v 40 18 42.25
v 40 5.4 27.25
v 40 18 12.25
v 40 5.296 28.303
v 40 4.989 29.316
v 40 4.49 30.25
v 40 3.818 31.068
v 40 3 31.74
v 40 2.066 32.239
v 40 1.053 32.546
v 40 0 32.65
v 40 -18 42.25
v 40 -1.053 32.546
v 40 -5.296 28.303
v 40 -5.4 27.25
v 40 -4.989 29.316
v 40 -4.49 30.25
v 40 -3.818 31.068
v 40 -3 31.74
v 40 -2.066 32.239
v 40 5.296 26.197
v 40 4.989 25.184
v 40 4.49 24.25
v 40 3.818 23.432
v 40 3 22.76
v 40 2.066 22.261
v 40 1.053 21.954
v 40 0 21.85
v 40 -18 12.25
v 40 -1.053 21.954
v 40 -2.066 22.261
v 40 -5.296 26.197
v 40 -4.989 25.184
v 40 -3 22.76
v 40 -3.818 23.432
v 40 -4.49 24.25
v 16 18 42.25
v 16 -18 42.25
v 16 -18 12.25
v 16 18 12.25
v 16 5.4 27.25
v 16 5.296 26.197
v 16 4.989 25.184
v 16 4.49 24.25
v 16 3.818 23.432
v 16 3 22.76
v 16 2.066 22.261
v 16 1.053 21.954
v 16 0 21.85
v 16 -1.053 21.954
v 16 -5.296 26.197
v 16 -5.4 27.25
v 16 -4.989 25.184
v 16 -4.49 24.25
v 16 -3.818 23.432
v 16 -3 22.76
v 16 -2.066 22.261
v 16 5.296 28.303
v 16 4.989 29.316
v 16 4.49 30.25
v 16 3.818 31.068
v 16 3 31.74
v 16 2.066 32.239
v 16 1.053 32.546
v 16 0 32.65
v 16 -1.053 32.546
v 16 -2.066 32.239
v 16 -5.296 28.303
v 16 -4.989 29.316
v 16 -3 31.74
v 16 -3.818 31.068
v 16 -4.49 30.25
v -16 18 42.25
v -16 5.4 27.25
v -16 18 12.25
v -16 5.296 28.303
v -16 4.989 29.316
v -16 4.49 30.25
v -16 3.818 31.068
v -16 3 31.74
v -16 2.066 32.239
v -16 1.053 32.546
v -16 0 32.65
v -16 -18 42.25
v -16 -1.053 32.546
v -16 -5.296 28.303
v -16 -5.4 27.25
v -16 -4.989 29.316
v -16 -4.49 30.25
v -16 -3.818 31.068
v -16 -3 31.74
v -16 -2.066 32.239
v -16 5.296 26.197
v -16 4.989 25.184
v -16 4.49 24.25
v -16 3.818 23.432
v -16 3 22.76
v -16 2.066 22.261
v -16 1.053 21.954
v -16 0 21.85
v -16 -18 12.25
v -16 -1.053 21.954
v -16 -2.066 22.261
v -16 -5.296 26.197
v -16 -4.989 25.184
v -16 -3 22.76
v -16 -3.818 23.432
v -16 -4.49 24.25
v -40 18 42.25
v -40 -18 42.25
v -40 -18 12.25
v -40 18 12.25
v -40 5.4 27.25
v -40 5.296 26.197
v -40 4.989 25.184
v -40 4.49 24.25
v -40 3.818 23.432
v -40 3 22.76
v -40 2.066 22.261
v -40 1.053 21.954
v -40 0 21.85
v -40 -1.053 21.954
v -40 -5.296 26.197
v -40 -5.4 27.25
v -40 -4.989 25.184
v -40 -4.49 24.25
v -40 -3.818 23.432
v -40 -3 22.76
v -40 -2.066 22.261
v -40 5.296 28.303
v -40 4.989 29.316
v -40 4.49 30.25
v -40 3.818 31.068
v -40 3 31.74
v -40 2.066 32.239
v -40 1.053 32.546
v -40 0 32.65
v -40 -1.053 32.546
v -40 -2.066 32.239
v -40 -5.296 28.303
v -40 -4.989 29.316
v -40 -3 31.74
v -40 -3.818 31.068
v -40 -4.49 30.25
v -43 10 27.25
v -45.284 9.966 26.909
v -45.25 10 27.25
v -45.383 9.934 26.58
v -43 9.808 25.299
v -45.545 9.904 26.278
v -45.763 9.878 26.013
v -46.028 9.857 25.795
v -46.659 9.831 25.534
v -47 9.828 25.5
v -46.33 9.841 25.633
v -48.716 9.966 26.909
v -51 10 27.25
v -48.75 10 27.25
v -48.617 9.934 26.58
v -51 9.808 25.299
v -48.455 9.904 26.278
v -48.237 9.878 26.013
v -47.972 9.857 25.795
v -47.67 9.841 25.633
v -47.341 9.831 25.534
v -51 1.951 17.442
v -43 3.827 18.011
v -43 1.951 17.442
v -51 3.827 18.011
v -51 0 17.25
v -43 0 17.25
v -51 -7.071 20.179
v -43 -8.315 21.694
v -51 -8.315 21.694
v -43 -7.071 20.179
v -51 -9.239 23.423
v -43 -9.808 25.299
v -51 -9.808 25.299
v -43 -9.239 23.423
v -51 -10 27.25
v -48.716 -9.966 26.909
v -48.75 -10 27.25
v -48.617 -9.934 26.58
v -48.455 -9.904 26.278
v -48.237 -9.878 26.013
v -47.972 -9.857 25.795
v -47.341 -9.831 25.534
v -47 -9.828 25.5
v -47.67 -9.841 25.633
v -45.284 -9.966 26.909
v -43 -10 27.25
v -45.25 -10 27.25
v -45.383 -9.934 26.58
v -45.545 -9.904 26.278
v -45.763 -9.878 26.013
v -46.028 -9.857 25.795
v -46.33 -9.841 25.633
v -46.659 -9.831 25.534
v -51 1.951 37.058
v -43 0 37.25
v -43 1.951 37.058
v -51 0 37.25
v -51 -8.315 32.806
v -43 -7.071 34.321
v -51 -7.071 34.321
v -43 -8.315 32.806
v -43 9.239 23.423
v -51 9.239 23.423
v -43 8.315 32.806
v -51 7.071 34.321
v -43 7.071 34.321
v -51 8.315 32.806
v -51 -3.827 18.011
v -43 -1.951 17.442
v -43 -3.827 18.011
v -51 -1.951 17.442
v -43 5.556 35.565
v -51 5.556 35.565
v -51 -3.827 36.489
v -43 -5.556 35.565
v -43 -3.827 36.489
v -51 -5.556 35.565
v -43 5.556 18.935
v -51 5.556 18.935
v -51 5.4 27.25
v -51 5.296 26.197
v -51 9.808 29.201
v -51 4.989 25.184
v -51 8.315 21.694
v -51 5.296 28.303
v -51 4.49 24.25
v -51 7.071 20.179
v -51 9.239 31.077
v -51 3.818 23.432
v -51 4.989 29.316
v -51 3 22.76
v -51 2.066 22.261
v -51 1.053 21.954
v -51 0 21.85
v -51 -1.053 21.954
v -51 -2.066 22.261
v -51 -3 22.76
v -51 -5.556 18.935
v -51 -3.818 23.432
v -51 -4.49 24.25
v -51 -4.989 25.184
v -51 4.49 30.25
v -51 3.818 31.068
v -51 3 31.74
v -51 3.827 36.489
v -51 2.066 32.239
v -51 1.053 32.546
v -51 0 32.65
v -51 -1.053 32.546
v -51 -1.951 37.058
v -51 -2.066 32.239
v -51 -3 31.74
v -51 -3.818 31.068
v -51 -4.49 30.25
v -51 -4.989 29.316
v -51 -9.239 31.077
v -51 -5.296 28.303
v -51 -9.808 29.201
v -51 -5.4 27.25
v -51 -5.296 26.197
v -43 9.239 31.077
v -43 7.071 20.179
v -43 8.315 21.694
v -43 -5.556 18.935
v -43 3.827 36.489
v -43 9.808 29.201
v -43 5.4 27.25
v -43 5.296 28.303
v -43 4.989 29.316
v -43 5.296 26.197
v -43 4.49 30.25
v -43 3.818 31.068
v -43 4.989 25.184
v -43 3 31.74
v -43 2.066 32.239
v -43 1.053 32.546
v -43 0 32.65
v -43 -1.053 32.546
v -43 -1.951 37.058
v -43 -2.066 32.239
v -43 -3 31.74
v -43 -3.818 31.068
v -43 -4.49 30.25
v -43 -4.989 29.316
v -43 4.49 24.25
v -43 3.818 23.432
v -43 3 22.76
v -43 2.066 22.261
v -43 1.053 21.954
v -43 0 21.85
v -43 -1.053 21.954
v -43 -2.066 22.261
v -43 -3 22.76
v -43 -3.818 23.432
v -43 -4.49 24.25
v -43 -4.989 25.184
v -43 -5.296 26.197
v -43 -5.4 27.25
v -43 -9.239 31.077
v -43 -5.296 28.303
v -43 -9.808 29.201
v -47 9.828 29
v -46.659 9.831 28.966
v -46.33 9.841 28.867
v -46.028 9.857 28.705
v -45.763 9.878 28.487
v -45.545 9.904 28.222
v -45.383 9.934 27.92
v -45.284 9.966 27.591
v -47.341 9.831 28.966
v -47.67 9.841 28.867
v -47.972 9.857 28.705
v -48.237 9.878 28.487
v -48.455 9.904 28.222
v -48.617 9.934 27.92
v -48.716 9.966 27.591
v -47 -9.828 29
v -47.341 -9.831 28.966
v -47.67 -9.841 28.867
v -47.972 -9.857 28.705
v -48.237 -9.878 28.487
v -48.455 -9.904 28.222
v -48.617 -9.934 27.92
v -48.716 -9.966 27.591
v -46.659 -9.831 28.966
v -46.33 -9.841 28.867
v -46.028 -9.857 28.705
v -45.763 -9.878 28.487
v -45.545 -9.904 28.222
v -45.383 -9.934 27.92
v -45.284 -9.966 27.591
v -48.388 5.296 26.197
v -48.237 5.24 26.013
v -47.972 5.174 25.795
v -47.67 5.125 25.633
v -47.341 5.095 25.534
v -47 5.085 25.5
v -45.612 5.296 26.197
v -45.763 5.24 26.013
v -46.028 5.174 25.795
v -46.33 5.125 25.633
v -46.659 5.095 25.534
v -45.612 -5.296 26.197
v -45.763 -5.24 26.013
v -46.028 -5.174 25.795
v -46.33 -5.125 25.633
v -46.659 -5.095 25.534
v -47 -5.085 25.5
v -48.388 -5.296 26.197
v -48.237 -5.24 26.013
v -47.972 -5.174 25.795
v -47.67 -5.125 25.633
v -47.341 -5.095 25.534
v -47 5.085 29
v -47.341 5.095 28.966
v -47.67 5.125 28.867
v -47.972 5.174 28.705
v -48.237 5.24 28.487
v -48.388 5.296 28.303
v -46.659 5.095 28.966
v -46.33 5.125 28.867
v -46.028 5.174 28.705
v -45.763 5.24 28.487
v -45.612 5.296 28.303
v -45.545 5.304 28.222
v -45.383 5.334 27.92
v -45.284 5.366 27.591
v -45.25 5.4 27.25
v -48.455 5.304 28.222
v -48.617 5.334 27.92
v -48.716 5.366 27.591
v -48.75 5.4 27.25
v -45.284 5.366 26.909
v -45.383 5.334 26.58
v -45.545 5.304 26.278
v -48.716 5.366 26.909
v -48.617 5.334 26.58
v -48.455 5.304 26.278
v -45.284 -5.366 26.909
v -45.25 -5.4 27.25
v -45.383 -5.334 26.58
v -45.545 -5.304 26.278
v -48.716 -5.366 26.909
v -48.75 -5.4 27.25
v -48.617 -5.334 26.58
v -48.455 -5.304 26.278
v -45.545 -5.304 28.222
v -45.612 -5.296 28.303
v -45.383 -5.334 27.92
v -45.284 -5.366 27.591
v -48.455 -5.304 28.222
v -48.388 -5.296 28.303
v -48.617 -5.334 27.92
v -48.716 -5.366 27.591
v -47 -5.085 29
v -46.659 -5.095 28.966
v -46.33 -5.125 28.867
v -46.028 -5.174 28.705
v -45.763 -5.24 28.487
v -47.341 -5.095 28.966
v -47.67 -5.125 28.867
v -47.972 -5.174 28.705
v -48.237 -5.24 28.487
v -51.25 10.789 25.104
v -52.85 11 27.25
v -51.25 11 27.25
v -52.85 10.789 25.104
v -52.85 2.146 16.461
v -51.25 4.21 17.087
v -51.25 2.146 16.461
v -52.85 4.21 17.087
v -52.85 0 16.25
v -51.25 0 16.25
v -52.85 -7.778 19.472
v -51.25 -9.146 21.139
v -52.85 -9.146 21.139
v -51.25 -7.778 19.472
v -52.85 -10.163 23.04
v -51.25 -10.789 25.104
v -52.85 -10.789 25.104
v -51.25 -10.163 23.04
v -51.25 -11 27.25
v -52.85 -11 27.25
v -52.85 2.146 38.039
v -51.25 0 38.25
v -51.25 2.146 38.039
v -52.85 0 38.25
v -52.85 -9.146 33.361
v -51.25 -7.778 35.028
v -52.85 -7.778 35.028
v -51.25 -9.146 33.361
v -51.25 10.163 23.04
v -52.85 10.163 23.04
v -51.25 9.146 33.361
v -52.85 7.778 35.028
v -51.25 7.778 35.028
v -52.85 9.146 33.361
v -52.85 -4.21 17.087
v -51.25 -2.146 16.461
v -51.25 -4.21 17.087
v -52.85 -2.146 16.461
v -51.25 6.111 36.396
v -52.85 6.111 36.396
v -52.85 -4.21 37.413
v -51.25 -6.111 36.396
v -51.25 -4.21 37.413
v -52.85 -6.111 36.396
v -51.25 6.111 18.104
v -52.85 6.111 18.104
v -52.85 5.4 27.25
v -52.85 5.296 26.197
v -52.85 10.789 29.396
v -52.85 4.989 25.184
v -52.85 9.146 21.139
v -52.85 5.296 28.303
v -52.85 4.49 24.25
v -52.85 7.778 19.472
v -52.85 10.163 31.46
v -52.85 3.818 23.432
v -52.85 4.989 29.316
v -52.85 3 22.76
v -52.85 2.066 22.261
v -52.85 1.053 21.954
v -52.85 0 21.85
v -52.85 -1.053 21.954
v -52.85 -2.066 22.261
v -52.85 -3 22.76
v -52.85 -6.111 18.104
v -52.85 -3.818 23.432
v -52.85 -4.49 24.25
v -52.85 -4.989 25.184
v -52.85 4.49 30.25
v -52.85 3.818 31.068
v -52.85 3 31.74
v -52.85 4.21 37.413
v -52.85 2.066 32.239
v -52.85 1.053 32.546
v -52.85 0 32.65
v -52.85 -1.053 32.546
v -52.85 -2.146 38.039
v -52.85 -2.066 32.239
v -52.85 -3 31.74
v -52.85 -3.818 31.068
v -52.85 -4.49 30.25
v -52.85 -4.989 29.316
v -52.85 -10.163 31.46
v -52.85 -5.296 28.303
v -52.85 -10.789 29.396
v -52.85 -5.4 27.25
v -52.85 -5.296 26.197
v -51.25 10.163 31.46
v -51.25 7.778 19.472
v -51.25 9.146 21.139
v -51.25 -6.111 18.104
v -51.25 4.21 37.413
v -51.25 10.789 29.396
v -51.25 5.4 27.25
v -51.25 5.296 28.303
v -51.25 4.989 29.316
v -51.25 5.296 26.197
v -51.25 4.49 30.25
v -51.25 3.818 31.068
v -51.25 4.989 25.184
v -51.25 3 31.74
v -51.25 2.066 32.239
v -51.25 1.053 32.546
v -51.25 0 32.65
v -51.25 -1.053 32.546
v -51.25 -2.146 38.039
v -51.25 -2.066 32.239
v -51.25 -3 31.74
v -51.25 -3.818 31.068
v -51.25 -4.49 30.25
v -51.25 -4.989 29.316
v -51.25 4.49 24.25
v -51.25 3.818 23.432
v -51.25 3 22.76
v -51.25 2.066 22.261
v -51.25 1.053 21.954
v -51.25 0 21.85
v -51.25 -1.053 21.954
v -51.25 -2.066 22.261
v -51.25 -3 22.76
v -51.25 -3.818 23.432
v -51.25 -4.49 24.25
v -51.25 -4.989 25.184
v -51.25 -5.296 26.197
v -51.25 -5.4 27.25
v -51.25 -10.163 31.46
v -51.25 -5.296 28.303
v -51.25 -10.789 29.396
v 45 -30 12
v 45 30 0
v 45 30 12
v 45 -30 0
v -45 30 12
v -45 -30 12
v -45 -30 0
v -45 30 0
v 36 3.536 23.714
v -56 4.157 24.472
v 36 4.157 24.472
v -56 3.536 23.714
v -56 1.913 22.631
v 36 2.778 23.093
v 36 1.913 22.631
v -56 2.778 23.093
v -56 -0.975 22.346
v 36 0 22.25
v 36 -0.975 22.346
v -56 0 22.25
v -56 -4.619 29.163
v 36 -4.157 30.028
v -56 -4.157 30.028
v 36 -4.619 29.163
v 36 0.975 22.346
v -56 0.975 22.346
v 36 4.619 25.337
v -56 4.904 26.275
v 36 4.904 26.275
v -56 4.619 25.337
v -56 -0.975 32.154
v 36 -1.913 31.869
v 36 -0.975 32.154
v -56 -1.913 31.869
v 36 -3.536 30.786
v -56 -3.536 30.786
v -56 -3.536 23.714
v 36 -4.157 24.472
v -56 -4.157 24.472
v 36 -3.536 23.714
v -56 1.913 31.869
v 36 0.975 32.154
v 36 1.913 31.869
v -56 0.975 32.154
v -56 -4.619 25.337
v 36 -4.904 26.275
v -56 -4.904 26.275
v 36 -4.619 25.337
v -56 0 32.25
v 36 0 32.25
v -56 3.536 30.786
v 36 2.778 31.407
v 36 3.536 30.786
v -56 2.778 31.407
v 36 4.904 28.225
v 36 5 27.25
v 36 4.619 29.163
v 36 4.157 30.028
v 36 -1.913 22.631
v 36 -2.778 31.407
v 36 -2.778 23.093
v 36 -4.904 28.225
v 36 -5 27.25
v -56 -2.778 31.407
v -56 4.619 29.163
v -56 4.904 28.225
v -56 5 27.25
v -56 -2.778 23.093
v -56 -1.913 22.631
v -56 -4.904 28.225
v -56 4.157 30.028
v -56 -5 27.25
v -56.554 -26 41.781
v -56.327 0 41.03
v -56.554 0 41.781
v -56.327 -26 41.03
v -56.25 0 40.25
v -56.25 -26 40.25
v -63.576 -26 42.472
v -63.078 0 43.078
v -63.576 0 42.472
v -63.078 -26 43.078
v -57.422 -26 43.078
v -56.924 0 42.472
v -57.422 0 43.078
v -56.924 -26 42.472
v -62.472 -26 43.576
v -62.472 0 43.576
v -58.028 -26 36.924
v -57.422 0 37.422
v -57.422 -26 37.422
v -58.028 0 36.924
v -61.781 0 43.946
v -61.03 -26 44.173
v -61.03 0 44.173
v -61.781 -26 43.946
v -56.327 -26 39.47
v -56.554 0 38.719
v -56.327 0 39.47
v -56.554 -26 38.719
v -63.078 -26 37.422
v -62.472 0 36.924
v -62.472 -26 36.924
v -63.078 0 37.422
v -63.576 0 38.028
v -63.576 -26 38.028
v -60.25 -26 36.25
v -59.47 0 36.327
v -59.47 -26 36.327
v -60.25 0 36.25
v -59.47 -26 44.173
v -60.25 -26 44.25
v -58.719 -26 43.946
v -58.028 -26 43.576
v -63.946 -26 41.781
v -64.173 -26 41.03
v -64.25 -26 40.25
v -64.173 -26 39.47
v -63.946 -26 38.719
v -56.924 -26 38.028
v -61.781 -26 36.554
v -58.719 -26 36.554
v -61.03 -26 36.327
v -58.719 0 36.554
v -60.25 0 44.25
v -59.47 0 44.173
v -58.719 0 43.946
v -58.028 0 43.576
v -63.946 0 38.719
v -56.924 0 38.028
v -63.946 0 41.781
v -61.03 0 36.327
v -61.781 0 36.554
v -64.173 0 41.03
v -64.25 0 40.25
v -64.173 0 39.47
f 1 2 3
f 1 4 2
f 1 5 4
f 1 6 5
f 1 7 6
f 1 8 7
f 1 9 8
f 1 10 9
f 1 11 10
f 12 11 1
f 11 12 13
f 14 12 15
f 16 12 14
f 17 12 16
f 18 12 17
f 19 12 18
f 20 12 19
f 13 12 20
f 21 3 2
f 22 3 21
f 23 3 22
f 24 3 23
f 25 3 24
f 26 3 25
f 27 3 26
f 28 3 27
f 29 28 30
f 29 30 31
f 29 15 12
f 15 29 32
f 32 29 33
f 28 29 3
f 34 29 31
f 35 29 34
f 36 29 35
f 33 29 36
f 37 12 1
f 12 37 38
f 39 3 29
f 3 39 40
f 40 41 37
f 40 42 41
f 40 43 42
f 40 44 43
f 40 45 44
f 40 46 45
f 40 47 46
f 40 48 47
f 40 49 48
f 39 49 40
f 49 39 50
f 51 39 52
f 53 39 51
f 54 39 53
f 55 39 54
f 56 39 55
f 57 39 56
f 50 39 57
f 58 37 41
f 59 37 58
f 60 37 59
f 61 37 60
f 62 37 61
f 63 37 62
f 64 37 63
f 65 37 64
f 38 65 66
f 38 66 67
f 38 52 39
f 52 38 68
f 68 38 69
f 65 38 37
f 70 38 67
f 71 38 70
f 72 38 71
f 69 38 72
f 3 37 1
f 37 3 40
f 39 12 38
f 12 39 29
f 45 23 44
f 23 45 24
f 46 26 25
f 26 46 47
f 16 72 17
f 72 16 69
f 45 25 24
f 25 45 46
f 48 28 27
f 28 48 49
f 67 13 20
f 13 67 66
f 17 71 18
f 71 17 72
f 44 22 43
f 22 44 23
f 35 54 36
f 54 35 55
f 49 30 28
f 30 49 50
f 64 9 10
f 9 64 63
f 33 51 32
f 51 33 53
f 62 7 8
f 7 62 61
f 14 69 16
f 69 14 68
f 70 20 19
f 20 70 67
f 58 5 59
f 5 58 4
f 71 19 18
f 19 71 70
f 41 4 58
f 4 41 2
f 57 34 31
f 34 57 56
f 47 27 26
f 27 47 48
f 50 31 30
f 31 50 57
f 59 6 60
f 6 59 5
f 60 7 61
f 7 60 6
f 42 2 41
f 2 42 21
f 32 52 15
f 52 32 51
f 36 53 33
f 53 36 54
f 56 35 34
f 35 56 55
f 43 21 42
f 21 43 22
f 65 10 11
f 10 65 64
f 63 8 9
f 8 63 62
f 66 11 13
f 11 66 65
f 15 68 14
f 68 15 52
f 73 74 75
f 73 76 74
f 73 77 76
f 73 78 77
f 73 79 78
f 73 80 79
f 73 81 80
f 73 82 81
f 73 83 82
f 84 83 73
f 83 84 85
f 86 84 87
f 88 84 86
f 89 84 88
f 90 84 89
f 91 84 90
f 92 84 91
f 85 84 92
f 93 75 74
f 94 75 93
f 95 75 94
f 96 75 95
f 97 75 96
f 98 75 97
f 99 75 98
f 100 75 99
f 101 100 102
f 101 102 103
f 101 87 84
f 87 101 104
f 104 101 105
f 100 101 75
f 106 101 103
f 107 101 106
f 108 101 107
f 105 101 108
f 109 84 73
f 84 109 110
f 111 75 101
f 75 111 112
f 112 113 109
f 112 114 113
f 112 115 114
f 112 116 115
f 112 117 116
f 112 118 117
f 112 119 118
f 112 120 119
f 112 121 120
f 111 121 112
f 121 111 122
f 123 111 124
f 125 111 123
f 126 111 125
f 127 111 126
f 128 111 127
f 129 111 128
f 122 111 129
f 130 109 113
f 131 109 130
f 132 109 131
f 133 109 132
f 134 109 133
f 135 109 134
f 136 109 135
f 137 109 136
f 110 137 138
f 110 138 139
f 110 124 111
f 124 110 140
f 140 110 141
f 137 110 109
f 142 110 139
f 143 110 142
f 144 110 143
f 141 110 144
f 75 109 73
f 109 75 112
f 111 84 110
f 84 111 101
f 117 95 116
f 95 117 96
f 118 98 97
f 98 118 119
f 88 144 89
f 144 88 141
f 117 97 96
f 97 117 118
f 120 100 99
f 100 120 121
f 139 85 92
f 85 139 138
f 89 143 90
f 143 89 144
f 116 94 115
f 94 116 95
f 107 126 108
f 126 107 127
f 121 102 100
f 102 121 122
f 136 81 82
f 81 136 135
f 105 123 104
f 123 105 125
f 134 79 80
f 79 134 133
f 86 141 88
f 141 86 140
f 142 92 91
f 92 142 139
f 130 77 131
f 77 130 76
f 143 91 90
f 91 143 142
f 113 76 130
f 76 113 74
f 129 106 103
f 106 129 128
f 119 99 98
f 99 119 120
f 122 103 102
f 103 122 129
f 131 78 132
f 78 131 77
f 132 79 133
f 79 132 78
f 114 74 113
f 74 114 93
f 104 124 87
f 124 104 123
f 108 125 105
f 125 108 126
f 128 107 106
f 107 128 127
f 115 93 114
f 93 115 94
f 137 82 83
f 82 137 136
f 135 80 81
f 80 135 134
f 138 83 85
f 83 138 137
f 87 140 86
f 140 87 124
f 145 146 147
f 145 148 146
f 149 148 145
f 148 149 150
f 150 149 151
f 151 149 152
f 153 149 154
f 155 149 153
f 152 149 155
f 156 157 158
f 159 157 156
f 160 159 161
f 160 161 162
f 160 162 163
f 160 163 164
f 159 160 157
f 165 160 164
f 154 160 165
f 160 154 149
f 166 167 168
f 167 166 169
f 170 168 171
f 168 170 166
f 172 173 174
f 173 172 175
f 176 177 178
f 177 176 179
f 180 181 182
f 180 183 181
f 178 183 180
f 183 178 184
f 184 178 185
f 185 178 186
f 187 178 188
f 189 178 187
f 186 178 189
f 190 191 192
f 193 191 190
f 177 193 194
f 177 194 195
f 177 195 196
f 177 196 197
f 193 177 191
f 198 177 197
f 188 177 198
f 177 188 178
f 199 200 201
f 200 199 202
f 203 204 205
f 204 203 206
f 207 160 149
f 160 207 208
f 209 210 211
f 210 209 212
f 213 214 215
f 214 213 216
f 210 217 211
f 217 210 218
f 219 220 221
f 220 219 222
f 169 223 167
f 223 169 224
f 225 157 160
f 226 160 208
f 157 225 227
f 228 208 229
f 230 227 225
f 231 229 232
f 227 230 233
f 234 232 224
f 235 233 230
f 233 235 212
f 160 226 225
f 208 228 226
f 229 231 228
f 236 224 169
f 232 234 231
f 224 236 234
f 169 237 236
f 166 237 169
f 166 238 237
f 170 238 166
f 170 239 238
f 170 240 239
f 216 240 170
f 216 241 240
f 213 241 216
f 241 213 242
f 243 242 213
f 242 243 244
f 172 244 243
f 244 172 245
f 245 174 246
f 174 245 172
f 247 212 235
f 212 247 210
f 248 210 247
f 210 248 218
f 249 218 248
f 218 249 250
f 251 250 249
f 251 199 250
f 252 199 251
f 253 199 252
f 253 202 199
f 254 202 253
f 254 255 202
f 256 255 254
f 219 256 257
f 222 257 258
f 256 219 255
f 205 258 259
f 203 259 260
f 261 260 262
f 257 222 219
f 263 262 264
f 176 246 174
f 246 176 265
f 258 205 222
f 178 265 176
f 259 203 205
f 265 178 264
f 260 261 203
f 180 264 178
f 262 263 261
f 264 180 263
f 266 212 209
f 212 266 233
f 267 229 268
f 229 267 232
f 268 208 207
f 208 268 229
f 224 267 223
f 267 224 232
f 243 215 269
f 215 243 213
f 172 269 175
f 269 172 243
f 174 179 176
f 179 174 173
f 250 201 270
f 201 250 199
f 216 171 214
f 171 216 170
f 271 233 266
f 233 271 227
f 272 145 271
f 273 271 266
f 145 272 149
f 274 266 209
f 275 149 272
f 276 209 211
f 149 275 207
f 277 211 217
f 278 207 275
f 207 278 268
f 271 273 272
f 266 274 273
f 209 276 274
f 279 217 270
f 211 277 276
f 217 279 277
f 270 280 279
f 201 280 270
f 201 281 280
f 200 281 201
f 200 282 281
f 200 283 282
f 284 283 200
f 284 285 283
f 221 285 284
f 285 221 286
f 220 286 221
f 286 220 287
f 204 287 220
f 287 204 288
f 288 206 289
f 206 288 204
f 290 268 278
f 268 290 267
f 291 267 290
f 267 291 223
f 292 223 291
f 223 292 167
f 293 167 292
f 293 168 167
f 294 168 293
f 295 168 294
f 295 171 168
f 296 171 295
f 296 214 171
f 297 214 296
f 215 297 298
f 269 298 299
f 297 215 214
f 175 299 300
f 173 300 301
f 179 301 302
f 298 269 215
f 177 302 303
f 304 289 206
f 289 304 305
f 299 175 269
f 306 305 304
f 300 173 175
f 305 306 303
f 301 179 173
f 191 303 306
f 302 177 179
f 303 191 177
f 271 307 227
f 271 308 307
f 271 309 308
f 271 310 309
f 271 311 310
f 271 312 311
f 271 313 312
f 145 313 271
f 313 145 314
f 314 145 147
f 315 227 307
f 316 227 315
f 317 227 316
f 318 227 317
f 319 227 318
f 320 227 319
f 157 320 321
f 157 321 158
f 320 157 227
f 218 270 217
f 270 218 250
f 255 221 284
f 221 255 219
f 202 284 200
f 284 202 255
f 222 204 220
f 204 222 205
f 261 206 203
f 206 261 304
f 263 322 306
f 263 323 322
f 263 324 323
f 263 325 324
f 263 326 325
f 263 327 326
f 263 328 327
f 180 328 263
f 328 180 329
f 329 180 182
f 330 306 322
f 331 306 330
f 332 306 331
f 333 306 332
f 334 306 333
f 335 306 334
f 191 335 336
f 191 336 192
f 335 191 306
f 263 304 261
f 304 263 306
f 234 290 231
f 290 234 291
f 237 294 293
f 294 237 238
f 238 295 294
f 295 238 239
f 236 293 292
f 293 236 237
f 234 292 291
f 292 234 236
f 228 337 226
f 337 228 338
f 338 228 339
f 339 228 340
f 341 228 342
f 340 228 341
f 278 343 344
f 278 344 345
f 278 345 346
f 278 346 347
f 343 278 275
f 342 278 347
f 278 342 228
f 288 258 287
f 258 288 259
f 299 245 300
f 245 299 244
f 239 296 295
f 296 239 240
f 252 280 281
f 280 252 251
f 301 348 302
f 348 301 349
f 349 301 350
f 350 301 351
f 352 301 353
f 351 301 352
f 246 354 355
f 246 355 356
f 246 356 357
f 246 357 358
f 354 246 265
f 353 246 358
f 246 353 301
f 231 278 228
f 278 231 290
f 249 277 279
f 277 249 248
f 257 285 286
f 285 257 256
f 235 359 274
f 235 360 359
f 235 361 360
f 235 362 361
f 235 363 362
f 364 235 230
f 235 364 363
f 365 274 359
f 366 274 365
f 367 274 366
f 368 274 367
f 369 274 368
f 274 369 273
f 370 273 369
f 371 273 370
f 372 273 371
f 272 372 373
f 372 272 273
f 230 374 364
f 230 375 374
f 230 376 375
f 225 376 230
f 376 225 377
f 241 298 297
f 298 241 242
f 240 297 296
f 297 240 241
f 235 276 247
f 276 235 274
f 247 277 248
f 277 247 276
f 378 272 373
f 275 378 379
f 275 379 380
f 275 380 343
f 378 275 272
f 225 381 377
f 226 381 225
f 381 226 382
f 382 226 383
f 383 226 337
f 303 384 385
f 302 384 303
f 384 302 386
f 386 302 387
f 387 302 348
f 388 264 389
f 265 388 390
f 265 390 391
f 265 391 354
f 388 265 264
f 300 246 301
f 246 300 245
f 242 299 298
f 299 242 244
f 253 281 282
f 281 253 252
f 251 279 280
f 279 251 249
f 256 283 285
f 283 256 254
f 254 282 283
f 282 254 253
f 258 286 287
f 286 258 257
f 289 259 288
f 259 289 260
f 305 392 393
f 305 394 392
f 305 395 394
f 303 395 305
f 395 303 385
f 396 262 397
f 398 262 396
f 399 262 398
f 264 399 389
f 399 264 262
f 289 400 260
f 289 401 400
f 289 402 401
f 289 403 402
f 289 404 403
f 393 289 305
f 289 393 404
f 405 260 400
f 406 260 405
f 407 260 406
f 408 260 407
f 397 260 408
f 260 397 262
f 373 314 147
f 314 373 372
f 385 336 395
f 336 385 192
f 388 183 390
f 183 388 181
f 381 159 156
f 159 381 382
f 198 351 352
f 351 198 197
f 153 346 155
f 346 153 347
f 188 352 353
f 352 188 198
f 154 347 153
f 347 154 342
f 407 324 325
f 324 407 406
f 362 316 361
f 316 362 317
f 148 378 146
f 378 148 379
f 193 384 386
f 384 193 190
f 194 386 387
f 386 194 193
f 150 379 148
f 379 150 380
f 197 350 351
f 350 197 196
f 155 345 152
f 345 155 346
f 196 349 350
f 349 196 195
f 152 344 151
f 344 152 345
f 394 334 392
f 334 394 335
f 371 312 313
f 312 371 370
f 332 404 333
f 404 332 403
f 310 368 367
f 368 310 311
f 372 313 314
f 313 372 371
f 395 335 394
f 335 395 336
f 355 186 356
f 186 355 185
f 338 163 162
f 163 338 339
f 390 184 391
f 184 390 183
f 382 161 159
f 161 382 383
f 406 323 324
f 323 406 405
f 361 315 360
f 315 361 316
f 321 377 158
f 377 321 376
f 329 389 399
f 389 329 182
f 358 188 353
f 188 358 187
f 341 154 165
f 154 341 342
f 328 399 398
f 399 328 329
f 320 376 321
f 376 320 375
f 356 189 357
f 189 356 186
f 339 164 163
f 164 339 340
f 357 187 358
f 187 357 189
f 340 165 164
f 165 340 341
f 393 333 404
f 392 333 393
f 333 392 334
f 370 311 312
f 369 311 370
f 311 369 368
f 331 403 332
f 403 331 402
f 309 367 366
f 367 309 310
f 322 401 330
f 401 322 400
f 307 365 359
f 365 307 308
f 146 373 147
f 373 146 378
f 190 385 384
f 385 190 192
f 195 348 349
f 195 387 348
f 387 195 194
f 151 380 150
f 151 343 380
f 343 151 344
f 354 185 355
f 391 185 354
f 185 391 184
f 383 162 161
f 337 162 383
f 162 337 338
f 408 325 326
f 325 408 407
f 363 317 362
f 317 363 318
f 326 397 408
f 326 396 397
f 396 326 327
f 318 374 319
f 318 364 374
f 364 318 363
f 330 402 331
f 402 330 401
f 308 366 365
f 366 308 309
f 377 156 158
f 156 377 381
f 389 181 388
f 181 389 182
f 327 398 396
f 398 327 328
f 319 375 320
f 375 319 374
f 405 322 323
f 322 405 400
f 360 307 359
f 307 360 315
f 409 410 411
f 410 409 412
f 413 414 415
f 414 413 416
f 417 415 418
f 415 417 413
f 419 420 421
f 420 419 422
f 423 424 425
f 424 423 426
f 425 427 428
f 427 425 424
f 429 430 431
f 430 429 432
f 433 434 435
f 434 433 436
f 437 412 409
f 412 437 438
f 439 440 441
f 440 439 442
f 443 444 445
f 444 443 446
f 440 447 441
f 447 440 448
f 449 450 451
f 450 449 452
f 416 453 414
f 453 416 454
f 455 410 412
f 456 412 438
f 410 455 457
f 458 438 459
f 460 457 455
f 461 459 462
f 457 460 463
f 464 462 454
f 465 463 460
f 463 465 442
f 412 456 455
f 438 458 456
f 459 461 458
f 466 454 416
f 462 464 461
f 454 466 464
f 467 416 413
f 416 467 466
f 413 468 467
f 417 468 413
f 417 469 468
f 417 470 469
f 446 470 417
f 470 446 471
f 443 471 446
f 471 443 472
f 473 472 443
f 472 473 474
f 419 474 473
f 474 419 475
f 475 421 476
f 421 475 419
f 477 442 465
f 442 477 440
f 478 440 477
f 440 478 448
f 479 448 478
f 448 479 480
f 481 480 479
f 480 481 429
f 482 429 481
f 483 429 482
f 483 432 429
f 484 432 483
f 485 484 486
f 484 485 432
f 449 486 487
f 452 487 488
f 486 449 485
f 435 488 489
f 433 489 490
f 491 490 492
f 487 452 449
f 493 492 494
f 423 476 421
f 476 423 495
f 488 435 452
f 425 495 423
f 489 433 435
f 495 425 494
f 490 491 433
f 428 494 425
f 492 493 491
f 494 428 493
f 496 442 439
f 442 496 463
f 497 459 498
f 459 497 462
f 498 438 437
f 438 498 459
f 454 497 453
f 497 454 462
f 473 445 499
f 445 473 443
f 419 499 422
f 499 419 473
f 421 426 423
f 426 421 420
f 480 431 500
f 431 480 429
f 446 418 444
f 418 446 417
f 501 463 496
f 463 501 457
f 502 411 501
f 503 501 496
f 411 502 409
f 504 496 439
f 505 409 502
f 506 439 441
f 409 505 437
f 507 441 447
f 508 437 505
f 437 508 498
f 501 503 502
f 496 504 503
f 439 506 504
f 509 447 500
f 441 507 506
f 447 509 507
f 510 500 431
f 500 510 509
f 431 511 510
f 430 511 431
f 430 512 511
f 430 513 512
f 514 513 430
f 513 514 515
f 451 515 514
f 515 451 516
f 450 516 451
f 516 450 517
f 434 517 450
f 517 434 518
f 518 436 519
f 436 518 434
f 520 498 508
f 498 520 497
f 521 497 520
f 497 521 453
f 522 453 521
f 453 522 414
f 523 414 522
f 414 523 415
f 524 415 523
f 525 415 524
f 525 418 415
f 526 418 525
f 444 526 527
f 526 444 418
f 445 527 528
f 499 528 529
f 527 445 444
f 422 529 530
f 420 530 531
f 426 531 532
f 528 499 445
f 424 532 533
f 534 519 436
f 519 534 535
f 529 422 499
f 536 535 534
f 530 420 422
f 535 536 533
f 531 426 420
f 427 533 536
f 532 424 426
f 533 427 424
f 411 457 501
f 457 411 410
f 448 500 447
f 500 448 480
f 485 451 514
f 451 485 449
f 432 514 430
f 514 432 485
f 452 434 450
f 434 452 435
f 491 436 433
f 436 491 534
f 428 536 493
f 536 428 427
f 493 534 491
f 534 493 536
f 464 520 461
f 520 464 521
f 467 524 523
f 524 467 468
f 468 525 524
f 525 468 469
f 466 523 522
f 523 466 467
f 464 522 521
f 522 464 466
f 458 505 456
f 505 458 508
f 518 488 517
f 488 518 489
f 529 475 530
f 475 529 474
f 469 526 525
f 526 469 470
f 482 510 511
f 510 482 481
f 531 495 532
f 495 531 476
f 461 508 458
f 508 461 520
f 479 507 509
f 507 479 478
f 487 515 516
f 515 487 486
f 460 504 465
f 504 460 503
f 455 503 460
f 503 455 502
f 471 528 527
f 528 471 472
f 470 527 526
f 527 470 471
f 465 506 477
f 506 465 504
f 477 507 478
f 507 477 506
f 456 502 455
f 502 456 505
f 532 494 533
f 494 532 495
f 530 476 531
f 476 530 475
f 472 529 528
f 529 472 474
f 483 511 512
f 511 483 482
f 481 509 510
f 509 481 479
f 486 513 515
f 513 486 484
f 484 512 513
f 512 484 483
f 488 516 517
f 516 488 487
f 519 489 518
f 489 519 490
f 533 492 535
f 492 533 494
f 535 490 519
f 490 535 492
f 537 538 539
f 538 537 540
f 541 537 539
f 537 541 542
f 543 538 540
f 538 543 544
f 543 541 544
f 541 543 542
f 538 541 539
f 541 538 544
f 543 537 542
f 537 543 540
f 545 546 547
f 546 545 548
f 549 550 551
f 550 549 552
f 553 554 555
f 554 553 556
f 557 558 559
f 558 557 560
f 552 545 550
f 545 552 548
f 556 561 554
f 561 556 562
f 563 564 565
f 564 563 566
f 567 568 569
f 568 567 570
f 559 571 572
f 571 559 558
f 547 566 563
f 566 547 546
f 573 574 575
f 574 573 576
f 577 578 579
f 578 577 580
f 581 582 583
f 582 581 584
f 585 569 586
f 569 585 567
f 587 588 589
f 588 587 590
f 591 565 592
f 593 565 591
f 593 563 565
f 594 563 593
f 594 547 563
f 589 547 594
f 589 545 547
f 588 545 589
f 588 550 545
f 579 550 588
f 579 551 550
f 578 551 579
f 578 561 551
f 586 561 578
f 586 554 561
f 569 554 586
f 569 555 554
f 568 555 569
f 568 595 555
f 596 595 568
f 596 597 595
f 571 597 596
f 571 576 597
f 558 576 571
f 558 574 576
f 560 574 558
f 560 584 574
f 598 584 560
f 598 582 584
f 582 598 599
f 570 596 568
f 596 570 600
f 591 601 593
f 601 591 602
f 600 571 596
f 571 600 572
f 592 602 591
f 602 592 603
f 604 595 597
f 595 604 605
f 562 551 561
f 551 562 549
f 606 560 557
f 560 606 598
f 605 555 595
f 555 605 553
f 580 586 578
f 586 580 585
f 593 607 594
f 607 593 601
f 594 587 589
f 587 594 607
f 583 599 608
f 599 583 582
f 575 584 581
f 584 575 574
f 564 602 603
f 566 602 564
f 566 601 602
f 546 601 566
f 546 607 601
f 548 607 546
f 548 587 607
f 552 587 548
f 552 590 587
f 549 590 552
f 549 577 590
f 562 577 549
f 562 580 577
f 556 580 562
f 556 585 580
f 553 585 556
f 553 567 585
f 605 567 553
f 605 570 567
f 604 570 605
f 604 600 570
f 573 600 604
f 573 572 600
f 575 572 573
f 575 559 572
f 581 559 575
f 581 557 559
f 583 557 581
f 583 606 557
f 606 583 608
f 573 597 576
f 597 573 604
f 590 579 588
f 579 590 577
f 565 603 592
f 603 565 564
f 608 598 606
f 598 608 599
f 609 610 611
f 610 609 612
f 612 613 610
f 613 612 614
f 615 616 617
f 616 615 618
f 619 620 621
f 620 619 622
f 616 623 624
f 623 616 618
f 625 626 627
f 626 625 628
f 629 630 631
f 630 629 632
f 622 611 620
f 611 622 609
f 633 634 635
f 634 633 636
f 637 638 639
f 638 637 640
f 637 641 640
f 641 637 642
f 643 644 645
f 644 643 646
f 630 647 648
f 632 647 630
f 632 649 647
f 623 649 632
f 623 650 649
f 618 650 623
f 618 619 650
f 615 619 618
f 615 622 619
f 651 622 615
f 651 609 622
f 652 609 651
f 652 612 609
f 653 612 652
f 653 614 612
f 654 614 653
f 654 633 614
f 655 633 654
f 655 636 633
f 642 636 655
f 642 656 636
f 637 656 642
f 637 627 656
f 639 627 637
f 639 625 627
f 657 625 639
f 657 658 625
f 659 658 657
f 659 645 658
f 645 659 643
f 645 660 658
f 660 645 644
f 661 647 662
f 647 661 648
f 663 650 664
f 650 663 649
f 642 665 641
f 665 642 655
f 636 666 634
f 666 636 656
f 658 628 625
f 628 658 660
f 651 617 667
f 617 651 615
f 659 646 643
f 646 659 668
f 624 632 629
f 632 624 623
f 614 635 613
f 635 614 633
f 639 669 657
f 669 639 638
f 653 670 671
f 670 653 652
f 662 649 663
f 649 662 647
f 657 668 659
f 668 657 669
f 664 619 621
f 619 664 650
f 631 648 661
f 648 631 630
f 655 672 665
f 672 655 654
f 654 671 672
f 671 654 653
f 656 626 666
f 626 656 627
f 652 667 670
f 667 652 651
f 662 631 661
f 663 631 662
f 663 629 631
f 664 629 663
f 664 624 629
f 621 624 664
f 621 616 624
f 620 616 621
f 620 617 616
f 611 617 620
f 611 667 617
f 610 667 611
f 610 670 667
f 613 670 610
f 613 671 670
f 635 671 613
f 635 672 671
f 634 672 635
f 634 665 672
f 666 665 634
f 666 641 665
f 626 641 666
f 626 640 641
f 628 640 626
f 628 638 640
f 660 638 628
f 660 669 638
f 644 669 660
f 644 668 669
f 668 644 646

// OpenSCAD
$fn = 32;

// ------------------------------------------------------------------------
// Machine vise: screw d10, jaws 24 x 30 mm
// Every part is its own module, assembly() places every instance.
// ------------------------------------------------------------------------

// --- part 1 ---
module vise_bed() {
  difference() {
    translate([-45, -30, 0]) cube([90, 60, 12]);
  }
}

// --- part 2 ---
module vise_jaw() {
  difference() {
    translate([-12, -18, 0]) cube([24, 36, 30]);
    translate([0, 0, 15]) rotate([0, 90, 0]) cylinder(h = 26, d = 10.8, center = true);
  }
}

// --- part 3 ---
module vise_screw() {
  translate([0, 0, -46]) cylinder(h = 92, d = 10);
}

// --- part 4 ---
module screw_collar() {
  difference() {
    cylinder(h = 8, d = 20);
    translate([0, 0, -1]) cylinder(h = 10, d = 10.8);
    translate([0, 0, 4]) rotate([90, 0, 0]) cylinder(h = 22, d = 3.5, center = true);
  }
}

// --- part 5 ---
module screw_washer() {
  difference() {
      translate([0, 0, 0]) cylinder(h = 1.6, d = 22);
      translate([0, 0, -1]) cylinder(h = 3.6, d = 10.8);
    }
}

// --- part 6 ---
module vise_handle() {
  cylinder(h = 26, d = 8);
}

// --- assembly ---
module assembly() {
  color([0.80, 0.24, 0.20]) translate([0, 0, 0]) rotate([0, 0, 0]) vise_bed();
  color([0.20, 0.45, 0.75]) translate([28, 0, 12.25]) rotate([0, 0, 0]) vise_jaw();
  color([0.25, 0.62, 0.32]) translate([-28, 0, 12.25]) rotate([0, 0, 0]) vise_jaw();
  color([0.92, 0.70, 0.18]) translate([-10, 0, 27.25]) rotate([0, 90, 0]) vise_screw();
  color([0.58, 0.35, 0.70]) translate([-51, 0, 27.25]) rotate([0, 90, 0]) screw_collar();
  color([0.16, 0.66, 0.66]) translate([-52.85, 0, 27.25]) rotate([0, 90, 0]) screw_washer();
  color([0.85, 0.48, 0.18]) translate([-60.25, 0, 40.25]) rotate([90, 0, 0]) vise_handle();
}

assembly();
